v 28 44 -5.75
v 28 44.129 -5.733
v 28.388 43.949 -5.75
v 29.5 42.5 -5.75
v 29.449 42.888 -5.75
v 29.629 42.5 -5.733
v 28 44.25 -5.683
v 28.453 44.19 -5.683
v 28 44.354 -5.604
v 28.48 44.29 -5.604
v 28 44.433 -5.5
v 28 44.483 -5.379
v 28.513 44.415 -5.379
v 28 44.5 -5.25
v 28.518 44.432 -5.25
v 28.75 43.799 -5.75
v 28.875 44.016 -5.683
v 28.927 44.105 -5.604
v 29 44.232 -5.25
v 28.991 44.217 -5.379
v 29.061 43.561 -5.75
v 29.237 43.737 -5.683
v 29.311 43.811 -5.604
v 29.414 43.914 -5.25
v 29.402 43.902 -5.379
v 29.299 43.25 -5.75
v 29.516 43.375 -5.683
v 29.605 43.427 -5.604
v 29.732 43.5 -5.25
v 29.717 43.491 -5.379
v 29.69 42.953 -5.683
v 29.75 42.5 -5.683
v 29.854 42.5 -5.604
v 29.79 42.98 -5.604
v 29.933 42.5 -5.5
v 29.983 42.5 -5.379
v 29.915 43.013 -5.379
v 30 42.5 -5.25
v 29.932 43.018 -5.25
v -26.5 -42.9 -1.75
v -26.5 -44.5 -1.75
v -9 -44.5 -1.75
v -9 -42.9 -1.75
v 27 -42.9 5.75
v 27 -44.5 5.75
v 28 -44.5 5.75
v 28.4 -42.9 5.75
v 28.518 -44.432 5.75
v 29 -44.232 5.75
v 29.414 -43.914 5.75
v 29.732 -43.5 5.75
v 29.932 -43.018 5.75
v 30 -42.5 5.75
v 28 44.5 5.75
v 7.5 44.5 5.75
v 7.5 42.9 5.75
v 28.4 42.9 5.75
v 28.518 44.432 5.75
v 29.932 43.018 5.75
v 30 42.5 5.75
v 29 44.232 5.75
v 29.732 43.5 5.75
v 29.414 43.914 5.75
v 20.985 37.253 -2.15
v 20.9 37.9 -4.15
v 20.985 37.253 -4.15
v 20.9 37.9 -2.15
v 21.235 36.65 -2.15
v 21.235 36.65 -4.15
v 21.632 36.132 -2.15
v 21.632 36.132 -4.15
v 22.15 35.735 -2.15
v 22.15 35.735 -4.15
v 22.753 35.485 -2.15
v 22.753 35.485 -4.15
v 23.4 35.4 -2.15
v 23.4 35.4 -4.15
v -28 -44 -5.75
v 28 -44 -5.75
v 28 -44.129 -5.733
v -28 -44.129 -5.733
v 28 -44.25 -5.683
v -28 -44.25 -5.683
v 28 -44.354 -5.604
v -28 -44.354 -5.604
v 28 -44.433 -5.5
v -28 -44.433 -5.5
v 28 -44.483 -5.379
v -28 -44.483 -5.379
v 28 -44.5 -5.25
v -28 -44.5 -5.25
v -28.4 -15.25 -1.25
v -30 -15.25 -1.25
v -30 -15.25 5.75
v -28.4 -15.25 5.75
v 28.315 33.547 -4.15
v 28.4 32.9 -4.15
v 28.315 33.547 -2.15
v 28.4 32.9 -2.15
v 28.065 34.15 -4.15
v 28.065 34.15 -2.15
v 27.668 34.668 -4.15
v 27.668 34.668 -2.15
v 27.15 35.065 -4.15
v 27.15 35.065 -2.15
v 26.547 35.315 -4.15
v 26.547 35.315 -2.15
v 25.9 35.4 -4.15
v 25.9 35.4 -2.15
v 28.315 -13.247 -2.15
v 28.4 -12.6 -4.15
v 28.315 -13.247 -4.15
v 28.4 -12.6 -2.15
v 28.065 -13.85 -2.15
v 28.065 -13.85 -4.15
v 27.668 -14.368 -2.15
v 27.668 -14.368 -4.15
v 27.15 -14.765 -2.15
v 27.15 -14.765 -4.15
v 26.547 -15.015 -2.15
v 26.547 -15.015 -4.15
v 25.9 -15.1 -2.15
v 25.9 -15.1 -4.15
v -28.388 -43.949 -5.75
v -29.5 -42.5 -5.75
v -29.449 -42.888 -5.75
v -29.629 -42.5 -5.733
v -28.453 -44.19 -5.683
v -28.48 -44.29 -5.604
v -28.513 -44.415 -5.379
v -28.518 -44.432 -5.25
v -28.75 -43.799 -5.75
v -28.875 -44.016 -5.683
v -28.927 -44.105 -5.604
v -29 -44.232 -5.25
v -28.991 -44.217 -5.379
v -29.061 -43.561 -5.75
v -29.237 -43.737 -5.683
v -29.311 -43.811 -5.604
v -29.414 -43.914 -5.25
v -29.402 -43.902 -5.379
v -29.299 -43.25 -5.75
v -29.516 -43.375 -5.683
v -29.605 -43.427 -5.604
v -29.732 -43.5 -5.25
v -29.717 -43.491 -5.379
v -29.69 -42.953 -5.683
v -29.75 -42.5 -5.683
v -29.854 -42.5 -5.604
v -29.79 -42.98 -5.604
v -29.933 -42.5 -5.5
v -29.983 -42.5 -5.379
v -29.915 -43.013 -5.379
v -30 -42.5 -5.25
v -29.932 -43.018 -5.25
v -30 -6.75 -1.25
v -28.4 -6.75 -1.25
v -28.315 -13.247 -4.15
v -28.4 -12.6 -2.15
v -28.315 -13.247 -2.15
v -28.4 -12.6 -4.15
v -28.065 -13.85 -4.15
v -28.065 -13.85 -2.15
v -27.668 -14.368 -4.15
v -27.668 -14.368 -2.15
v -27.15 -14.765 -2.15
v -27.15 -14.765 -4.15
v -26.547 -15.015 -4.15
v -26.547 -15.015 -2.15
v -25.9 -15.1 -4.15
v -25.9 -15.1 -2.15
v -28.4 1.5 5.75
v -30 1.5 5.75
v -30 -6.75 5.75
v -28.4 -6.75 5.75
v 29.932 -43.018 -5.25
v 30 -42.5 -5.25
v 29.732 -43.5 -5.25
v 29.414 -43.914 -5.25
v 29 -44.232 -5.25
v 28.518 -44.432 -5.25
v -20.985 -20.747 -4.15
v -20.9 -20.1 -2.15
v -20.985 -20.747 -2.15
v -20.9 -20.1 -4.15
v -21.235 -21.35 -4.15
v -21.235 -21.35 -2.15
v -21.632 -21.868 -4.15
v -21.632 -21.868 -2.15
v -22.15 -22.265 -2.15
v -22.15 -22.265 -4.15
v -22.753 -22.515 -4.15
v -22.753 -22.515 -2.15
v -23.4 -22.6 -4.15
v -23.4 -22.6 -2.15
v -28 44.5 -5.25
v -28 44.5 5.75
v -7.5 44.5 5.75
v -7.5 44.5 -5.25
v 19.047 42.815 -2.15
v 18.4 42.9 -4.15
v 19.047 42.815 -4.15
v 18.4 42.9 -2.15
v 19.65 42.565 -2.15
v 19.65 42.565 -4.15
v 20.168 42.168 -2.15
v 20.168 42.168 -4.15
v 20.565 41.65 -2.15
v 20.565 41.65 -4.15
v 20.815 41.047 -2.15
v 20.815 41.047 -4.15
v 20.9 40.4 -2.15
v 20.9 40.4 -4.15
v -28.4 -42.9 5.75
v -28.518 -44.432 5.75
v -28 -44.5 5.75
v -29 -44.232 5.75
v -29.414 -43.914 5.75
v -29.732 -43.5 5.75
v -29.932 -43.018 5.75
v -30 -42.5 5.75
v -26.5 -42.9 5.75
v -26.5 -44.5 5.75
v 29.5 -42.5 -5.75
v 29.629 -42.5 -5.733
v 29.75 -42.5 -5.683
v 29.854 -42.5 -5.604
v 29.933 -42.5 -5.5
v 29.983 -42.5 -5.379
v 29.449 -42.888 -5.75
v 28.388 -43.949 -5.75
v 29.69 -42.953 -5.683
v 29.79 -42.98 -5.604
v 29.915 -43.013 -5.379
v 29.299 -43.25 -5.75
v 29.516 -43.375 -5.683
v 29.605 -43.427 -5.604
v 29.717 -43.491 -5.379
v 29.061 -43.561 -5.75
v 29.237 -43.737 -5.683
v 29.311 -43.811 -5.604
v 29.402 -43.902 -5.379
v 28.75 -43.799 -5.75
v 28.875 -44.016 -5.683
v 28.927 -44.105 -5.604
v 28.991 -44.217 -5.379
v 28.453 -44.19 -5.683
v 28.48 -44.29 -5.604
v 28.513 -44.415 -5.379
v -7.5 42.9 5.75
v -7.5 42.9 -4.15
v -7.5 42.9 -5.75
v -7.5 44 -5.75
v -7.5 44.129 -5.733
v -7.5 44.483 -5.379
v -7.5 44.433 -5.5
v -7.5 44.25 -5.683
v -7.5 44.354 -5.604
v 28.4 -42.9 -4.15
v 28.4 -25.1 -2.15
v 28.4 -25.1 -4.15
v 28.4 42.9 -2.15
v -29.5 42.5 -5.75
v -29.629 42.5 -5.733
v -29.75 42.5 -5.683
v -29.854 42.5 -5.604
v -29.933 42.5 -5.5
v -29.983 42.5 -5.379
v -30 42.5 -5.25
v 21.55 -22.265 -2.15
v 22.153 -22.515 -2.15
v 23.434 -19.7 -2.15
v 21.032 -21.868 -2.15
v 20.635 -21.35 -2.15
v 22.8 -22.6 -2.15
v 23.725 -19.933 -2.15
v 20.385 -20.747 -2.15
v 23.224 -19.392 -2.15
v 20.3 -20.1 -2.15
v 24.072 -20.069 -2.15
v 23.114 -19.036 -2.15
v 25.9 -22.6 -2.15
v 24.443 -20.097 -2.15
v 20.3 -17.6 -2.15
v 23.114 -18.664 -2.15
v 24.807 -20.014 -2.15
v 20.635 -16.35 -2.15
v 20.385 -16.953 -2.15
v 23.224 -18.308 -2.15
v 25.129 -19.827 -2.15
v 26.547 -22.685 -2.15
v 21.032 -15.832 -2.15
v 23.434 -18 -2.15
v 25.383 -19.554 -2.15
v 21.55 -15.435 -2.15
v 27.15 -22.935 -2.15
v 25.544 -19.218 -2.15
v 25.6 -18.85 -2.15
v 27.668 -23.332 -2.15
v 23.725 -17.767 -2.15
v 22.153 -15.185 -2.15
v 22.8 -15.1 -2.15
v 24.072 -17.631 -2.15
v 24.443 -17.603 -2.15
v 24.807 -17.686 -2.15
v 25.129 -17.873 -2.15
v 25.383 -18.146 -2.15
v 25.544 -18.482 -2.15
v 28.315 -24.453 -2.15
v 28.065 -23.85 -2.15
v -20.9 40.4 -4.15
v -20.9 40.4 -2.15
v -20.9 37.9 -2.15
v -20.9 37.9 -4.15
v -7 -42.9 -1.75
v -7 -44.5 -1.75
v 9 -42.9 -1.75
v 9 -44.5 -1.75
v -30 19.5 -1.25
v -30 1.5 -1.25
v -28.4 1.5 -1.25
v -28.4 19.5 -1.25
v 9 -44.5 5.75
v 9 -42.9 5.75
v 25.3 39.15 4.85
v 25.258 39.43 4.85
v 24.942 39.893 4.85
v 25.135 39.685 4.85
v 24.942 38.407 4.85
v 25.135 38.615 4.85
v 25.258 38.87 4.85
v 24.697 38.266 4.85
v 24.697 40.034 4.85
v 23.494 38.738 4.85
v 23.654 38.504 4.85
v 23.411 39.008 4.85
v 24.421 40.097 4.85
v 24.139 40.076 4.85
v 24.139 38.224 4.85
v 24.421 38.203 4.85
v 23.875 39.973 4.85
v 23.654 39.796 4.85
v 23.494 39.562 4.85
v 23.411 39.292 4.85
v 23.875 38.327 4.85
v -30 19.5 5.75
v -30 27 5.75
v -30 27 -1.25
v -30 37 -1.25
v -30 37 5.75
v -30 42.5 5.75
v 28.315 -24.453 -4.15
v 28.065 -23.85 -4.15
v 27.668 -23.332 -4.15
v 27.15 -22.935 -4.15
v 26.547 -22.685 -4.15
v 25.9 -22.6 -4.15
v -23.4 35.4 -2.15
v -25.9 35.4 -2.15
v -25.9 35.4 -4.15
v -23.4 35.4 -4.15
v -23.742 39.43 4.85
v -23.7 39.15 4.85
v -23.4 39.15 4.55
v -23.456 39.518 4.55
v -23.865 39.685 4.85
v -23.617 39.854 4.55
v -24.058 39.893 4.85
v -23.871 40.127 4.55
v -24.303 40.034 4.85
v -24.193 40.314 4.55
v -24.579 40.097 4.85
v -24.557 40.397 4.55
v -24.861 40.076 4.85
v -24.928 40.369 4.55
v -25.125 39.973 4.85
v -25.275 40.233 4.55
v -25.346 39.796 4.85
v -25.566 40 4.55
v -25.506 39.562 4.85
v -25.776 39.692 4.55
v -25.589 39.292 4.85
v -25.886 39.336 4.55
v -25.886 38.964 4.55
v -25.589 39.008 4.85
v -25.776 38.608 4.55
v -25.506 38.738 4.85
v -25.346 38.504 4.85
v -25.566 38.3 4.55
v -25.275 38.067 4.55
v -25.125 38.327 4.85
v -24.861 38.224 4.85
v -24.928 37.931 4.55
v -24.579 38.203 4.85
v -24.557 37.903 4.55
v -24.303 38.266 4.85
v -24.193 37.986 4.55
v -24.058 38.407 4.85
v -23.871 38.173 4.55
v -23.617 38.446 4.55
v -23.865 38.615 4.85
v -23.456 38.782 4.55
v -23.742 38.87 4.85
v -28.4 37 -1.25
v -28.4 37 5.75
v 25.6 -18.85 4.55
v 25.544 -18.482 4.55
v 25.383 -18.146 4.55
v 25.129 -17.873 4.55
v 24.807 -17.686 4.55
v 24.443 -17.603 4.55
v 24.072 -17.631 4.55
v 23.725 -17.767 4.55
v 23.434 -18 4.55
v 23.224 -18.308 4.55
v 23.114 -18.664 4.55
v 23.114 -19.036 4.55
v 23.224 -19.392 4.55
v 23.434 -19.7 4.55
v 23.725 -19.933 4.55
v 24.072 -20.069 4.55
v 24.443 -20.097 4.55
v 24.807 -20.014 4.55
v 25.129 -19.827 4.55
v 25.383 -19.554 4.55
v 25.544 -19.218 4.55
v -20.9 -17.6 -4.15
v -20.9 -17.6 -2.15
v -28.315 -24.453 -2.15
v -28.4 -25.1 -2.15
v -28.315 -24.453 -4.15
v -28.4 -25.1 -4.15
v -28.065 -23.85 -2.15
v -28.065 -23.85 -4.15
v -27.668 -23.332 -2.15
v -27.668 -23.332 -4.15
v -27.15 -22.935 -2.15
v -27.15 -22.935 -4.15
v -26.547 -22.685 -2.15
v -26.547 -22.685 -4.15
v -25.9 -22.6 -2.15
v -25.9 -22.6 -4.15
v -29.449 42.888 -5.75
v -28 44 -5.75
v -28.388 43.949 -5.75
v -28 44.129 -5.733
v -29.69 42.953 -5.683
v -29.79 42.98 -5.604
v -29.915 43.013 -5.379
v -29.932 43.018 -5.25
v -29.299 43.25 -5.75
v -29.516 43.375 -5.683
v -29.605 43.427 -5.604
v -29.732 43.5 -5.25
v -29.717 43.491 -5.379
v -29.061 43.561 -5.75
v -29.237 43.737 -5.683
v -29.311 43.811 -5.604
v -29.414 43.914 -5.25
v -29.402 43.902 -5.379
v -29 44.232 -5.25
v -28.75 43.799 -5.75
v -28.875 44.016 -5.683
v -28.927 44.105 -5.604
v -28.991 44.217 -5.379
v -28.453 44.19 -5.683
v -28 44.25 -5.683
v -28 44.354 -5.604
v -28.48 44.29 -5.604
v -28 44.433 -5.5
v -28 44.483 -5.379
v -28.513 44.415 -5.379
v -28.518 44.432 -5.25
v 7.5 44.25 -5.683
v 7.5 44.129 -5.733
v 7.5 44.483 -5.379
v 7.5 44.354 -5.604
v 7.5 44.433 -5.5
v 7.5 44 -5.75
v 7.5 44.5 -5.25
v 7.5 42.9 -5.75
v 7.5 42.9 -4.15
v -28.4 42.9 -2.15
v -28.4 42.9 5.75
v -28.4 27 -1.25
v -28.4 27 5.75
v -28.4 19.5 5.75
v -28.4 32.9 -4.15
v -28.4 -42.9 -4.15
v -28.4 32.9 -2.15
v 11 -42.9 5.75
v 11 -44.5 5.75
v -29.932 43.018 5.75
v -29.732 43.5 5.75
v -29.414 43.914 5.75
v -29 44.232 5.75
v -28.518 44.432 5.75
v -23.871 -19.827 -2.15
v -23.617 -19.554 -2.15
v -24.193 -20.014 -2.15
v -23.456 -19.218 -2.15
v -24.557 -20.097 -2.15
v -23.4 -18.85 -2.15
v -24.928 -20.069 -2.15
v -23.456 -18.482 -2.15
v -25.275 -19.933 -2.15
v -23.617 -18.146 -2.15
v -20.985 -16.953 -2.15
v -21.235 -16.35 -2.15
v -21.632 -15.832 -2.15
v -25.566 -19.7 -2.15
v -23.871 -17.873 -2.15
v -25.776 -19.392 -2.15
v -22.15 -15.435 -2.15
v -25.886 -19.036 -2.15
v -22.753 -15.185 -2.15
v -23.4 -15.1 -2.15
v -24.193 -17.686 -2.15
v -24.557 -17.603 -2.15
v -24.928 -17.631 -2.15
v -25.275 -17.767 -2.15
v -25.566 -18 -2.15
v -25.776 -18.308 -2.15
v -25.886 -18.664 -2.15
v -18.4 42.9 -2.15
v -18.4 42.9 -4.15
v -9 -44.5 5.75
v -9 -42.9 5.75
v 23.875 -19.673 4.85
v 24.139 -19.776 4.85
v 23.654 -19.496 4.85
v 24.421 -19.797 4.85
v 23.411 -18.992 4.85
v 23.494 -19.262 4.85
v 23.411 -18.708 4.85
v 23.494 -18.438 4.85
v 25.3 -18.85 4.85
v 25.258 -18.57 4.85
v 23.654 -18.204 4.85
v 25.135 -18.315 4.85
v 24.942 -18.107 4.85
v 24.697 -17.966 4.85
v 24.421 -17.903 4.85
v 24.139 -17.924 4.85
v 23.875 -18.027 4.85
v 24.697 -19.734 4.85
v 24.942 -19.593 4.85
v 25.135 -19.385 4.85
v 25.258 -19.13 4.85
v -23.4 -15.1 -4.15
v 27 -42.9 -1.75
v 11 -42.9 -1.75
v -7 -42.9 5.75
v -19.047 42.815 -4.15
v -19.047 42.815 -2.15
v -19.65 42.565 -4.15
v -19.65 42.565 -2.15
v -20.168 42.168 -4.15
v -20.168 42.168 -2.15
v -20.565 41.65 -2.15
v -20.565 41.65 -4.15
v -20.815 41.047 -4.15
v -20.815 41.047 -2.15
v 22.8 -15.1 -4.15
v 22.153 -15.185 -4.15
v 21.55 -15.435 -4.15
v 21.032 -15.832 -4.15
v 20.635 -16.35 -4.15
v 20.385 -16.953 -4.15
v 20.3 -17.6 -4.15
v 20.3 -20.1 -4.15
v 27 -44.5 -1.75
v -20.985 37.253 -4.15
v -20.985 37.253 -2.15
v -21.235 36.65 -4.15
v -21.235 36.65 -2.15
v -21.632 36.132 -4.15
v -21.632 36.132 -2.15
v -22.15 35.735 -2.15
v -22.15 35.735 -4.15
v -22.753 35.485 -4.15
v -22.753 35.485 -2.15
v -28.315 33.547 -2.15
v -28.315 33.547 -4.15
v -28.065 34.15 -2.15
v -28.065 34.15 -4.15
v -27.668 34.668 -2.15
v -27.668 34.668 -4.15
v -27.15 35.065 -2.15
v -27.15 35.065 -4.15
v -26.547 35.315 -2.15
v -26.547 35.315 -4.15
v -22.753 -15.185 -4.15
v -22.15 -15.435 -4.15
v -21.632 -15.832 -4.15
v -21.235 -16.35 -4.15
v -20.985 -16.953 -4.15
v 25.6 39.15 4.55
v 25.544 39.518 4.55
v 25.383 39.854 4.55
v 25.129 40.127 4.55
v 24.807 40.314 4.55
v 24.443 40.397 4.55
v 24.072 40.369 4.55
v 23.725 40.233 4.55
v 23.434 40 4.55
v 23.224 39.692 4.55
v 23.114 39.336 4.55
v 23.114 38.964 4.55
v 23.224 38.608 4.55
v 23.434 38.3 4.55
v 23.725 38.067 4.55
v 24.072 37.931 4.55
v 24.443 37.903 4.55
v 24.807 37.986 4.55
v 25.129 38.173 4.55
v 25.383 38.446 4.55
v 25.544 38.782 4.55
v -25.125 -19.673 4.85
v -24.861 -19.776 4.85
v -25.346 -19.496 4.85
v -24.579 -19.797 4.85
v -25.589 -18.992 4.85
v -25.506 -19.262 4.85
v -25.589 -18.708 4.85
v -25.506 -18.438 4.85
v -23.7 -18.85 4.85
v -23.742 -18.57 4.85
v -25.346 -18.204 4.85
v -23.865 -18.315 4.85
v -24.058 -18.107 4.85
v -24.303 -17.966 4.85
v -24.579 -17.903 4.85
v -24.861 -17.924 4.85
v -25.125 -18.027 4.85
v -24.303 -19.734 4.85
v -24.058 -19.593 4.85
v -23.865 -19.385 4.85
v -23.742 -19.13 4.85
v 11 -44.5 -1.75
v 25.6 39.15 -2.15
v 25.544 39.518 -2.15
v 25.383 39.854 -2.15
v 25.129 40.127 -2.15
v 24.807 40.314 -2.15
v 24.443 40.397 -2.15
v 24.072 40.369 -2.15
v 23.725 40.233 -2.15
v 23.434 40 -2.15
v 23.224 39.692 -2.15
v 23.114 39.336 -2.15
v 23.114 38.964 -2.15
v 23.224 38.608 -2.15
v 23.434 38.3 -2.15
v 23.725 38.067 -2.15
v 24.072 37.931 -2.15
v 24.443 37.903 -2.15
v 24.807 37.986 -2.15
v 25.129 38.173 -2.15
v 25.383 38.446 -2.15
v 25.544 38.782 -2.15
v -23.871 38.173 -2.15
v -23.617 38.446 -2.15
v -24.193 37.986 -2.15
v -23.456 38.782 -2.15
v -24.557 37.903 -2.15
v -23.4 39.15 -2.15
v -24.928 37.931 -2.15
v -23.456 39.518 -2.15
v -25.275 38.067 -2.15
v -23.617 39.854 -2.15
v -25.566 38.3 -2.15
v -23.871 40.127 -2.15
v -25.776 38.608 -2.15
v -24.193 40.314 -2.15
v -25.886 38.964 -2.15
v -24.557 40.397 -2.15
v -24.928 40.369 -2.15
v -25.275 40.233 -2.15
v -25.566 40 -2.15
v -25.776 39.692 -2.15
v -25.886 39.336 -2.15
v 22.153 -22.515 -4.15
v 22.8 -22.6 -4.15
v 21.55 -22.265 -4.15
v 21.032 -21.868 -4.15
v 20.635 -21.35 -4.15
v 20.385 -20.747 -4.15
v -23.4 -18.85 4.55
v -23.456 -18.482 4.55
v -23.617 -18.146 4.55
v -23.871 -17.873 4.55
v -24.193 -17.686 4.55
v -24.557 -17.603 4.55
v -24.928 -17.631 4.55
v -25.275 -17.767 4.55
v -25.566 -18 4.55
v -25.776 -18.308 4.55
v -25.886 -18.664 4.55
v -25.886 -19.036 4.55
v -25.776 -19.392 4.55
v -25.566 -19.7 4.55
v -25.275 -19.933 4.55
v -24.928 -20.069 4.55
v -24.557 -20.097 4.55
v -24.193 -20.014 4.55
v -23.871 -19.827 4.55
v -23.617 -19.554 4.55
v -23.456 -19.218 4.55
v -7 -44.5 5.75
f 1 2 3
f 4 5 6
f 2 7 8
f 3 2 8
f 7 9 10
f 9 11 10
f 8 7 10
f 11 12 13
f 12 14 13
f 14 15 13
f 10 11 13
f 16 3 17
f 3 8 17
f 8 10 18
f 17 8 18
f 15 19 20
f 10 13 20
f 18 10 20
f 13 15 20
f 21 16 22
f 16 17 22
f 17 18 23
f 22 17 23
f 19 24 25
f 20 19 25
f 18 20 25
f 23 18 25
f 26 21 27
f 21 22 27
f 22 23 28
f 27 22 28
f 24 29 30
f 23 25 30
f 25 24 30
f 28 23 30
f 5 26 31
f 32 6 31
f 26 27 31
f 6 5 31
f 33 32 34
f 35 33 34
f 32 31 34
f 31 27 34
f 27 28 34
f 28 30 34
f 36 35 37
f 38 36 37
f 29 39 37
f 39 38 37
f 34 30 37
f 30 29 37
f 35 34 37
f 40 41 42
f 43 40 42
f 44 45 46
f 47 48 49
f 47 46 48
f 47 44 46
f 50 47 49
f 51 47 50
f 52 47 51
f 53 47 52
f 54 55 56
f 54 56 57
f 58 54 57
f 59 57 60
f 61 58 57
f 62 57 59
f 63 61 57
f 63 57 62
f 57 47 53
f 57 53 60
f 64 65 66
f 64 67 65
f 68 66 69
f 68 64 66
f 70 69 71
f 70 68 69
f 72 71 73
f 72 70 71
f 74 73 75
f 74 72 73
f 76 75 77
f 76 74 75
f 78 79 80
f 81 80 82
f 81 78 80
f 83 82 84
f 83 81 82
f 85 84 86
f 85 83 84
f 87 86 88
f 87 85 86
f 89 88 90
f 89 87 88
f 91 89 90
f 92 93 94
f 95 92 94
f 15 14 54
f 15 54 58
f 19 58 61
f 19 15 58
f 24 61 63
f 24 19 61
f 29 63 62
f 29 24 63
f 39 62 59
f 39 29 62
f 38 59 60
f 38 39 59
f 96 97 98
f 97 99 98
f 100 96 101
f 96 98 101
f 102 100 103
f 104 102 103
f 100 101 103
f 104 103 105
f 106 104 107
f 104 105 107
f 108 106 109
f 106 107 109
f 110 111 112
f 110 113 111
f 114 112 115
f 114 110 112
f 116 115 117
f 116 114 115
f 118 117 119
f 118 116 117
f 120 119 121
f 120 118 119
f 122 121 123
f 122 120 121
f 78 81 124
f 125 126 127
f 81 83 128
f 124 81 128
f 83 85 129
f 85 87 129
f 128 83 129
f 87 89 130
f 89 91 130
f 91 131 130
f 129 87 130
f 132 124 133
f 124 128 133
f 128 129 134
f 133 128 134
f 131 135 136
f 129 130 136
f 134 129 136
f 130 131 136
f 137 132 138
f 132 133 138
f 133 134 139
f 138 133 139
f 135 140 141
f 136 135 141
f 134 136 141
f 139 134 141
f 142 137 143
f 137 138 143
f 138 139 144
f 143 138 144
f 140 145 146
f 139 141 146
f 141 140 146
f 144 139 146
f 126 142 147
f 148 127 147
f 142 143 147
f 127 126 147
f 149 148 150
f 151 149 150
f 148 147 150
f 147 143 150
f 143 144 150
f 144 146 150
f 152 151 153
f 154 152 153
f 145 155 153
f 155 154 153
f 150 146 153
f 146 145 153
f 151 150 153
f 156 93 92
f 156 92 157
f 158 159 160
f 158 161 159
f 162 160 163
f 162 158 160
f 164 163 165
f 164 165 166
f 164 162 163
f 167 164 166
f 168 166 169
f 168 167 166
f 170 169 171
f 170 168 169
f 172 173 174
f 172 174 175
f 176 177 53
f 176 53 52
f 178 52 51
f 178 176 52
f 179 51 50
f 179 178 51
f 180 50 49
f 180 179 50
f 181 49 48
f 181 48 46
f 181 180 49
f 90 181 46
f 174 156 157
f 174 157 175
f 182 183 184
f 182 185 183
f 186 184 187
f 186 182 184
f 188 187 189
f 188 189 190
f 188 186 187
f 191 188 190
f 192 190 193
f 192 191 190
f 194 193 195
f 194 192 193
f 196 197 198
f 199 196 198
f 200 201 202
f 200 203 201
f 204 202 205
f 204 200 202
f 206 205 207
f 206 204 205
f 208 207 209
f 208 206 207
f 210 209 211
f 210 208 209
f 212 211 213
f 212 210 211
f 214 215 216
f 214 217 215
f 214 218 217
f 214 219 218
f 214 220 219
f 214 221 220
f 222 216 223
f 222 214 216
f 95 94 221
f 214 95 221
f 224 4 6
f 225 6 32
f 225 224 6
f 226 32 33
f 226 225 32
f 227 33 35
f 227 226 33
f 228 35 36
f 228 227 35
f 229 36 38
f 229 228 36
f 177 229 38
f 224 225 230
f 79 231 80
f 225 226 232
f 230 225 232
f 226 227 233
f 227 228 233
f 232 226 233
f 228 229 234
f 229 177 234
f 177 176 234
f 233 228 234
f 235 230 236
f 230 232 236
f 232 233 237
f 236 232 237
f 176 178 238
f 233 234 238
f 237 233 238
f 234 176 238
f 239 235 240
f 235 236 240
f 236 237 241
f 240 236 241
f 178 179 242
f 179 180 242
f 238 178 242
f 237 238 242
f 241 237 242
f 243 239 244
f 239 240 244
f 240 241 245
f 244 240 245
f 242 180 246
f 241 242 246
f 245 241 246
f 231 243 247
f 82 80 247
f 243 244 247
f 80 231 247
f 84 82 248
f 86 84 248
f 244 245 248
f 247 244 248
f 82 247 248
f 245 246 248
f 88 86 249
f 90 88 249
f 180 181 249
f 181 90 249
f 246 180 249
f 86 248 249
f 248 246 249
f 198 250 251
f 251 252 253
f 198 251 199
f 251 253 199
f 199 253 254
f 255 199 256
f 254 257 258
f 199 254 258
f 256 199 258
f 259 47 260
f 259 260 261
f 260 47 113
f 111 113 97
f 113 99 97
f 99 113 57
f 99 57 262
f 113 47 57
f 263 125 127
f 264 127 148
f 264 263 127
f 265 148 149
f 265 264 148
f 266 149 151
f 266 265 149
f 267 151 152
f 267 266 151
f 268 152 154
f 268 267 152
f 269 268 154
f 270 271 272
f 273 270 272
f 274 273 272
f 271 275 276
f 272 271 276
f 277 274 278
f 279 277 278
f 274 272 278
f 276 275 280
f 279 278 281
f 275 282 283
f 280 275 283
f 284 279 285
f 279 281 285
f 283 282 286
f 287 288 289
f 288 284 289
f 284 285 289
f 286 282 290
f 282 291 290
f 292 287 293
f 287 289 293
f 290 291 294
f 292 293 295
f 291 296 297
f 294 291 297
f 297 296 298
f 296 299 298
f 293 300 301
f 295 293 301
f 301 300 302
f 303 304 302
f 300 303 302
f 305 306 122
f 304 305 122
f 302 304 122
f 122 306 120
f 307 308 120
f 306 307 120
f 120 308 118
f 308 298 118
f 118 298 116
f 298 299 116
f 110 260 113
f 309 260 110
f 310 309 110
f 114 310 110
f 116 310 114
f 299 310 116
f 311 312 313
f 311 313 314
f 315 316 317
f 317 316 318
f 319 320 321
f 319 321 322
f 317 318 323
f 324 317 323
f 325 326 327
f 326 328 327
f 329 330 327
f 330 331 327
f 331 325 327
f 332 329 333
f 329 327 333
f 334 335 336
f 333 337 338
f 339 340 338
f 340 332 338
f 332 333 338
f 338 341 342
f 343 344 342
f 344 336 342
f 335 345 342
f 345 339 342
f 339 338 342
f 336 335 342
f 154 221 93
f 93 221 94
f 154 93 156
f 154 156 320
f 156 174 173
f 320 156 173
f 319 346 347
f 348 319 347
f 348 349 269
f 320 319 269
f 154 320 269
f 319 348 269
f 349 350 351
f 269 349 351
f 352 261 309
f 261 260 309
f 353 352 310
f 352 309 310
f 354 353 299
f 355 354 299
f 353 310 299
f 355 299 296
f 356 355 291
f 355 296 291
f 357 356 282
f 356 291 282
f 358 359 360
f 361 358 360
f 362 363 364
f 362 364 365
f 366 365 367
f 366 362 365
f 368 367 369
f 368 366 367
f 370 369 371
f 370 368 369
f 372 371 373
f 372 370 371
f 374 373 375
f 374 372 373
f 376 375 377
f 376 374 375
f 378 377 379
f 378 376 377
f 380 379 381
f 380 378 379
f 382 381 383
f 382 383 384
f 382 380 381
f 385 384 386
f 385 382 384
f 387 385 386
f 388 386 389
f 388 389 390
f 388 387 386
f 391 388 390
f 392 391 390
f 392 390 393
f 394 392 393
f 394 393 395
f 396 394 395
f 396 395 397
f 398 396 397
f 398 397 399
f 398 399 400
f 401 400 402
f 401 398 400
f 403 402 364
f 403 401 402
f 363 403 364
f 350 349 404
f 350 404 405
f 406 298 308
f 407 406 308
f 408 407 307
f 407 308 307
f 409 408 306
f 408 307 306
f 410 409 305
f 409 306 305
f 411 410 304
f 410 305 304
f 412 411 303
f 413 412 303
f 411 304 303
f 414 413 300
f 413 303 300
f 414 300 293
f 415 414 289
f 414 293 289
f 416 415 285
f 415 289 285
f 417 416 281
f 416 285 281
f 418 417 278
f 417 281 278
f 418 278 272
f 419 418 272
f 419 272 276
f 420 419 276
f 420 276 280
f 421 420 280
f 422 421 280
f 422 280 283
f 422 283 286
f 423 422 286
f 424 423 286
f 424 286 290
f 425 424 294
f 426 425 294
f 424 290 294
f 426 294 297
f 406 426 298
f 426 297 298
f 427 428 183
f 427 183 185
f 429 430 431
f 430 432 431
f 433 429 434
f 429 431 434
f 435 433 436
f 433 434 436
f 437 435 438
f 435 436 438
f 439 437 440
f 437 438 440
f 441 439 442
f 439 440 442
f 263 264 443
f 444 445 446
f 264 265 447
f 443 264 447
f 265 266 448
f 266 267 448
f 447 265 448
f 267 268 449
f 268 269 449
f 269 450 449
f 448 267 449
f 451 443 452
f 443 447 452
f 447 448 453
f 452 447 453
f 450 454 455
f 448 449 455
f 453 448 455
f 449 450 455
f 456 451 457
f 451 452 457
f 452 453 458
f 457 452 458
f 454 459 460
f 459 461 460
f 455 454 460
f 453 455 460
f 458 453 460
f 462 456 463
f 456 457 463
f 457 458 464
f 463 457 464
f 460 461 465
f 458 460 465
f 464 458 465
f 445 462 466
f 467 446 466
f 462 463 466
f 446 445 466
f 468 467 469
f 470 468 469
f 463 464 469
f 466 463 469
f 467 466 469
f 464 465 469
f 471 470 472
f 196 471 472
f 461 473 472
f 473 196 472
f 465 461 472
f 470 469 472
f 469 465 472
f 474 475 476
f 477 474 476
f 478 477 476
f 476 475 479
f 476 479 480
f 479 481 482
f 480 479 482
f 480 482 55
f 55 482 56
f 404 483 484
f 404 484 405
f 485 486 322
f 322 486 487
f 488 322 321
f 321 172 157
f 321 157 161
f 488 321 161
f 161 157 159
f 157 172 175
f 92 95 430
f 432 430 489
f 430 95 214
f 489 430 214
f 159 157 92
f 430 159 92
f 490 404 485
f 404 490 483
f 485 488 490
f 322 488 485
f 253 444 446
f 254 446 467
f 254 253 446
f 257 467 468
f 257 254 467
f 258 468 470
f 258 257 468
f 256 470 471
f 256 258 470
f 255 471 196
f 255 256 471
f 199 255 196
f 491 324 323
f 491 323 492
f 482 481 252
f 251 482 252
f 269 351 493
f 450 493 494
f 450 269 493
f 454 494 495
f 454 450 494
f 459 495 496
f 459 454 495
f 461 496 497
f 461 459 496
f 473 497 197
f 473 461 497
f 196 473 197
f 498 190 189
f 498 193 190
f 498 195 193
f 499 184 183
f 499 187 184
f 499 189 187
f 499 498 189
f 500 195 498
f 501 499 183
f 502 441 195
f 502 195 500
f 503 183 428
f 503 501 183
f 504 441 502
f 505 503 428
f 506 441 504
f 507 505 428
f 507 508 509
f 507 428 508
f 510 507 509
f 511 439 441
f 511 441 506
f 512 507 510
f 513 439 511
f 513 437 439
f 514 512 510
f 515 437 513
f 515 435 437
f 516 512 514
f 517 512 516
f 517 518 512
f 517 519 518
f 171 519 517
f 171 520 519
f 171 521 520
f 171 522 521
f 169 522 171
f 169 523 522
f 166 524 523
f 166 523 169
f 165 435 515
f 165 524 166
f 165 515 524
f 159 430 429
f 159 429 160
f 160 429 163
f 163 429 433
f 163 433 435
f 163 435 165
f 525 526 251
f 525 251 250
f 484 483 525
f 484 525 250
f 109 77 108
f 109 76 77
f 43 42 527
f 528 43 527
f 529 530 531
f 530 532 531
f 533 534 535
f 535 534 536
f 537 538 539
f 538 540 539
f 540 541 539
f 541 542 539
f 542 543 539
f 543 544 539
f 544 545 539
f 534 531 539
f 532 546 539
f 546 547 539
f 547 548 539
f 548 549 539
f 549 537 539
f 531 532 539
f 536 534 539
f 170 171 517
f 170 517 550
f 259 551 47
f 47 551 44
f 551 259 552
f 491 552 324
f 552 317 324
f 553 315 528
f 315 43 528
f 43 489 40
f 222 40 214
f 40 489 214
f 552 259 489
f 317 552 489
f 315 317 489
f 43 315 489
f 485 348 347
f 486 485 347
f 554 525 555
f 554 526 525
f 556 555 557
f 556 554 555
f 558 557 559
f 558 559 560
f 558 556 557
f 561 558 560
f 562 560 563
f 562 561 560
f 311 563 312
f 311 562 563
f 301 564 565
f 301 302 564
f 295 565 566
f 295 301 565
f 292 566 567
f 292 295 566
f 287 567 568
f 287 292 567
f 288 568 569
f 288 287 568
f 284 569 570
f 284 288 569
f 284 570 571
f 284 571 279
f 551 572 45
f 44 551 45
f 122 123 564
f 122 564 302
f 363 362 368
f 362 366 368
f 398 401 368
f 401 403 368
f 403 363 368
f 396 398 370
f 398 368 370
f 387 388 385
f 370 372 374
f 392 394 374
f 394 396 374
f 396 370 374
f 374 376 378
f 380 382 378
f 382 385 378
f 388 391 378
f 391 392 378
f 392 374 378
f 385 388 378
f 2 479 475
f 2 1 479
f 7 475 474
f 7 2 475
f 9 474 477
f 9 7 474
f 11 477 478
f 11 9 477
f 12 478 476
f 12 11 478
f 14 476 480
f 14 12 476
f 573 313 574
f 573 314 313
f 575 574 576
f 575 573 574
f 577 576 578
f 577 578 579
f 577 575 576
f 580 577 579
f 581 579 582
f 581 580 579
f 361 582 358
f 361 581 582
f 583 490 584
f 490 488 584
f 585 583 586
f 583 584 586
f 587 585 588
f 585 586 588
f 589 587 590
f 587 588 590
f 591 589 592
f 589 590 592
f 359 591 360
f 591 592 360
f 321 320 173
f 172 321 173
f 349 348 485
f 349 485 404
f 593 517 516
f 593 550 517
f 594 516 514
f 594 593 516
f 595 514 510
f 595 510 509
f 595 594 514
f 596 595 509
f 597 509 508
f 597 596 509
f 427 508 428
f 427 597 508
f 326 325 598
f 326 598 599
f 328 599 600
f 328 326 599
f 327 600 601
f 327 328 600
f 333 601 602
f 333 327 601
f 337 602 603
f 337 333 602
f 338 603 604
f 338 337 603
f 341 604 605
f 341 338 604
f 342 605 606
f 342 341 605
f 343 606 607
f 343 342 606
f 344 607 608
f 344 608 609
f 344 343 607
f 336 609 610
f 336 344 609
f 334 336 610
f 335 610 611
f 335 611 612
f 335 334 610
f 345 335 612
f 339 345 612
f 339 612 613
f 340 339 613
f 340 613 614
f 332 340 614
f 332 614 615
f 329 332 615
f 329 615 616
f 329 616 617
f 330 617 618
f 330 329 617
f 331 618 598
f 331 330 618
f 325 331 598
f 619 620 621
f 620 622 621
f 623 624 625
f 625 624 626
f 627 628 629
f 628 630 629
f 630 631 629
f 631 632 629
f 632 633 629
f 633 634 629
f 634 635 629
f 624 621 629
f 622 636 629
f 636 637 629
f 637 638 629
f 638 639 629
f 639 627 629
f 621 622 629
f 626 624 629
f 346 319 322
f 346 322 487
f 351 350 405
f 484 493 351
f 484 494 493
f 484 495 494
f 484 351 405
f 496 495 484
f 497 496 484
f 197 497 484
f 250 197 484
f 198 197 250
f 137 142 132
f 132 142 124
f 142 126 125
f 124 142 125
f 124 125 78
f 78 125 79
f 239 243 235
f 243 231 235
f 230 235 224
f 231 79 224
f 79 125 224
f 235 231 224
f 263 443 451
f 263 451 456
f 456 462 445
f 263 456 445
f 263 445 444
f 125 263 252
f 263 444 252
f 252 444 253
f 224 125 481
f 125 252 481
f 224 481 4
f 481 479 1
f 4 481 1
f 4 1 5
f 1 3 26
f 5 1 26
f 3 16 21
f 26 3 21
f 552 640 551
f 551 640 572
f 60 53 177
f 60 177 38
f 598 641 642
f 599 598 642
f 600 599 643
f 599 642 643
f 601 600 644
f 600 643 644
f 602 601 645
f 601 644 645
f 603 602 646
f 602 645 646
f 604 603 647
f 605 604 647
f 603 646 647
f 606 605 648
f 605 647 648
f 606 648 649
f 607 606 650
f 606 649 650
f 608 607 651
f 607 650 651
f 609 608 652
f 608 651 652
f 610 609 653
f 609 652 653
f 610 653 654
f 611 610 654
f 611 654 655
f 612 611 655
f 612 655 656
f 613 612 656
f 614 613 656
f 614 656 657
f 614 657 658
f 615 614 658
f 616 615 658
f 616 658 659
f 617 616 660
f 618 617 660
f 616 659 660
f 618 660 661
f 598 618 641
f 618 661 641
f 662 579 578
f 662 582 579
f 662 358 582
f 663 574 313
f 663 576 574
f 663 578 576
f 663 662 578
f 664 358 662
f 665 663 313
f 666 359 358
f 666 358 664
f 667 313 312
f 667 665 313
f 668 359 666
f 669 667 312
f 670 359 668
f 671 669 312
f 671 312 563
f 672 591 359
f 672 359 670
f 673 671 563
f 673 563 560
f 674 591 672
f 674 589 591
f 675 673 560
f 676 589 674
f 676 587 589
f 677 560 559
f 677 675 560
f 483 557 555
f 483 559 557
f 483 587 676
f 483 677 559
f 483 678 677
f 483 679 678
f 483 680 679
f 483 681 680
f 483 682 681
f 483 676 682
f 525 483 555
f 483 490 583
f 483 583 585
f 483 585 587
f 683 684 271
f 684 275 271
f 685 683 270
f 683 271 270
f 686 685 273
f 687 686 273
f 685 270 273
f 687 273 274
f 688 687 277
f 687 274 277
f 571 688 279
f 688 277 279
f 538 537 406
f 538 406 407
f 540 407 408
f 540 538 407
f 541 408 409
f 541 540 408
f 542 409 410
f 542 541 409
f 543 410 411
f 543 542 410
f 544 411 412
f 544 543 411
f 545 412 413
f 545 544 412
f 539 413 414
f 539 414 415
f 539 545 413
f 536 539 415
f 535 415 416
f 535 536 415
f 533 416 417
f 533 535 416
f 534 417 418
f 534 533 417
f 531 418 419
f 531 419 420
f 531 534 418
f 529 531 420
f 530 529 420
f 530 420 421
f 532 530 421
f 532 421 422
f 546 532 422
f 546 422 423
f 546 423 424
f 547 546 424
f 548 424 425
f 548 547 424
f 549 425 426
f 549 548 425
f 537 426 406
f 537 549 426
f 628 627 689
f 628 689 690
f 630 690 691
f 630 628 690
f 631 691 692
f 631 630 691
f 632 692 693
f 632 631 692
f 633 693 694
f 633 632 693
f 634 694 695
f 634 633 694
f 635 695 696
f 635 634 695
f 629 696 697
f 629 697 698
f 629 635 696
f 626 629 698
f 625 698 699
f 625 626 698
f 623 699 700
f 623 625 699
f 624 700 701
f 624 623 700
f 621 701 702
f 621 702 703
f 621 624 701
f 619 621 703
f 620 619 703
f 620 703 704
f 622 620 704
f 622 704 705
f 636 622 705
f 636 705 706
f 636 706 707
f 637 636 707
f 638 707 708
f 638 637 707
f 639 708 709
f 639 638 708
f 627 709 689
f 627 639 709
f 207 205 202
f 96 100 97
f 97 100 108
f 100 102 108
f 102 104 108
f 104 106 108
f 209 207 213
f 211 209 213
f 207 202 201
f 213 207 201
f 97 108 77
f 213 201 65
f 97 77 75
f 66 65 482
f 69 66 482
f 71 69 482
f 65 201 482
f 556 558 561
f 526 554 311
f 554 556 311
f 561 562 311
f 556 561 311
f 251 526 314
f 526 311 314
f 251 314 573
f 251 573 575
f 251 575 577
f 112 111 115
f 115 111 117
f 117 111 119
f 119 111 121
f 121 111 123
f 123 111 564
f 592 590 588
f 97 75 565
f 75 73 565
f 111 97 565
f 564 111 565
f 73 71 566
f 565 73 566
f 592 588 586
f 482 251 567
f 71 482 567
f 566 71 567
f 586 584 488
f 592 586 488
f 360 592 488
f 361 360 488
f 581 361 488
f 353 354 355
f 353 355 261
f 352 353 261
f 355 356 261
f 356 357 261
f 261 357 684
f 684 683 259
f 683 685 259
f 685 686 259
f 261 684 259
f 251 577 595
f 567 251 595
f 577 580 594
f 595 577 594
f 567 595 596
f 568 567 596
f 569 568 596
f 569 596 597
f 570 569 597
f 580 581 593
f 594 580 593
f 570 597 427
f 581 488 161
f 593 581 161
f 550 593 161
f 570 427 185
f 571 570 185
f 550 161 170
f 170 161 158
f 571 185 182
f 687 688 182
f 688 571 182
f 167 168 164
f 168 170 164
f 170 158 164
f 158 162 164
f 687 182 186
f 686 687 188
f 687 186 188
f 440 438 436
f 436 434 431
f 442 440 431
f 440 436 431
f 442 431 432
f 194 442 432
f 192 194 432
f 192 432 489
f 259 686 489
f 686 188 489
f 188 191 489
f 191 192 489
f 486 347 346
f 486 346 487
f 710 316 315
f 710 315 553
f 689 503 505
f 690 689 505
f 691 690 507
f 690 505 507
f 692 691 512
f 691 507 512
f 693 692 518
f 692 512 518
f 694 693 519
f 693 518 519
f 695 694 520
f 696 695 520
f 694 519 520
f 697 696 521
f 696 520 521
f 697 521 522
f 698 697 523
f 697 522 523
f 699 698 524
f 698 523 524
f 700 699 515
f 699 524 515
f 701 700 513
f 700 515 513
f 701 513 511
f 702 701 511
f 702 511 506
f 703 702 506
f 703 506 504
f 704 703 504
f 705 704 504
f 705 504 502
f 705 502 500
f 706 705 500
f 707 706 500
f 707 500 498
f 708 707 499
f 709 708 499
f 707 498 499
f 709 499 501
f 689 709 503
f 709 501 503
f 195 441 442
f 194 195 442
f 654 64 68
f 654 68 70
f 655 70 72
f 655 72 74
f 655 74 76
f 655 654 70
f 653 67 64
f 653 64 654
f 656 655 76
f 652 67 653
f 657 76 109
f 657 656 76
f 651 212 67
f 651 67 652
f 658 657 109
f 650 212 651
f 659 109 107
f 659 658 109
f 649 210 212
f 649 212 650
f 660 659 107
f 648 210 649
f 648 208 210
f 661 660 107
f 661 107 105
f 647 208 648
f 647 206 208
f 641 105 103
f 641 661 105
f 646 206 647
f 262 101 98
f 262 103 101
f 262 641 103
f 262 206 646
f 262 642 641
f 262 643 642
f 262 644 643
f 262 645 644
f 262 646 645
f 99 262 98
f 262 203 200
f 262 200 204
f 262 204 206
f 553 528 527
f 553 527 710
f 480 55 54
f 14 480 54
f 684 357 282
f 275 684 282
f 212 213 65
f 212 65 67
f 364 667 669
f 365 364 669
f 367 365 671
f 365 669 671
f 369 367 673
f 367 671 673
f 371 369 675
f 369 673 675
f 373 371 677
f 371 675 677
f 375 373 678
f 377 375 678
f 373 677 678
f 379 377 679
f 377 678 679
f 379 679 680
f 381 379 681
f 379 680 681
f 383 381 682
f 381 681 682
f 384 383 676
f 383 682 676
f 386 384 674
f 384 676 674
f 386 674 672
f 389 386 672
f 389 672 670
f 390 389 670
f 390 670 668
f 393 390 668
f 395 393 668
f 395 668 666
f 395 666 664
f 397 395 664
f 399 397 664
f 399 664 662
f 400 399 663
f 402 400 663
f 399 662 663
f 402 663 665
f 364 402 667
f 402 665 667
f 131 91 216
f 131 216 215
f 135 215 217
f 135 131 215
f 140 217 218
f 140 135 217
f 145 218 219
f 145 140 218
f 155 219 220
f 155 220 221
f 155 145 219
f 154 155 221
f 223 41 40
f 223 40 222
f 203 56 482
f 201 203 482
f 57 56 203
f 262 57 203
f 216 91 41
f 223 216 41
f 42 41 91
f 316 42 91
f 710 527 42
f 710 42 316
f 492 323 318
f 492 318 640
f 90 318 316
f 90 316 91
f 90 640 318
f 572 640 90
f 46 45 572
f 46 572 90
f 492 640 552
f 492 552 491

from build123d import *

# Parameters (mm, degrees)
ESQUISSE1_W              = 60
ESQUISSE1_H              = 89
BOSS_EXTRU_1_DEPTH       = 11.5
ESQUISSE2_W              = 15
ESQUISSE2_H              = 1.6
ENL_V_MAT_EXTRU_1_DEPTH  = 55.886246
ENL_V_MAT_EXTRU_2_REACH  = 94.584
ESQUISSE4_W              = 15
ESQUISSE4_H              = 9.9
ENL_V_MAT_EXTRU_3_REACH  = 75.647
ESQUISSE5_W              = 85.8
ESQUISSE5_H              = 9.9
ENL_V_MAT_EXTRU_4_REACH  = 75.647
ESQUISSE6_W              = 9.9
ESQUISSE6_H              = 85.8
ENL_V_MAT_EXTRU_5_REACH  = 76.922
ESQUISSE7_W              = 7
ESQUISSE7_H              = 10
ENL_V_MAT_EXTRU_6_REACH  = 76.922
ESQUISSE8_W              = 7
ESQUISSE8_H              = 18
ENL_V_MAT_EXTRU_7_REACH  = 96.096
ESQUISSE9_W              = 17.5
ESQUISSE9_H              = 7.5
ENL_V_MAT_EXTRU_8_REACH  = 96.096
ESQUISSE10_W             = 16
ESQUISSE10_H             = 7.5
ENL_V_MAT_EXTRU_9_REACH  = 96.096
ESQUISSE11_W             = 16
ESQUISSE11_H             = 7.5
ENL_V_MAT_EXTRU_10_REACH = 76.922
ESQUISSE12_W             = 7
ESQUISSE12_H             = 8.5
ESQUISSE23_W             = 2
ESQUISSE23_H             = 7.5
BOSS_EXTRU_5_DEPTH       = 7.5
ESQUISSE24_W             = 7.5
ESQUISSE24_H             = 2
BOSS_EXTRU_6_DEPTH       = 7.5
ESQUISSE25_W             = 2
ESQUISSE25_H             = 7.5
BOSS_EXTRU_7_DEPTH       = 8.1
ESQUISSE26_W             = 2
ESQUISSE26_H             = 7.5
BOSS_EXTRU_8_DEPTH       = 7.5
ESQUISSE28_W             = 1.25
ESQUISSE28_H             = 7
ESQUISSE29_W             = 1.25
ESQUISSE29_H             = 7
ESQUISSE30_W             = 1.25
ESQUISSE30_H             = 7
ESQUISSE31_W             = 1.25
ESQUISSE31_H             = 7
CONG_1_R                 = 2
CHANFREIN1_SIZE          = 0.3
CONG_2_R                 = 0.5
CONG_9_R                 = 2.5


with BuildPart() as part:
    # Esquisse1 → Boss.-Extru.1 (new body)
    with BuildSketch(Plane.XY.offset(5.75)):
        Rectangle(ESQUISSE1_W, ESQUISSE1_H)
    extrude(amount=-BOSS_EXTRU_1_DEPTH)

    # Esquisse2 → Enlèv. mat.-Extru.1 (cut, through all)
    with BuildSketch(Plane(origin=(0, 0, -5.75), x_dir=(-1, 0, 0), z_dir=(0, 0, -1))):
        with Locations((0, 43.7)):
            Rectangle(ESQUISSE2_W, ESQUISSE2_H)
    extrude(amount=-ENL_V_MAT_EXTRU_1_DEPTH, mode=Mode.SUBTRACT)

    # Esquisse4 → Enlèv. mat.-Extru.2 (cut, up to next)
    with BuildSketch(Plane.XZ.offset(42.9), mode=Mode.PRIVATE) as enl_v_mat_extru_2_sk1:
        with Locations((0, 0.8)):
            Rectangle(ESQUISSE4_W, ESQUISSE4_H)
    enl_v_mat_extru_2_tool1 = extrude(enl_v_mat_extru_2_sk1.sketch, amount=-ENL_V_MAT_EXTRU_2_REACH, mode=Mode.PRIVATE) & part.part
    add(enl_v_mat_extru_2_tool1.solids().sort_by_distance((0, -42.9, 0.8))[0], mode=Mode.SUBTRACT)

    # Esquisse5 → Enlèv. mat.-Extru.3 (cut, up to next)
    with BuildSketch(Plane(origin=(-28.4, 0, 0), x_dir=(0, -1, 0), z_dir=(-1, 0, 0)), mode=Mode.PRIVATE) as enl_v_mat_extru_3_sk1:
        with Locations((0, 0.8)):
            Rectangle(ESQUISSE5_W, ESQUISSE5_H)
    enl_v_mat_extru_3_tool1 = extrude(enl_v_mat_extru_3_sk1.sketch, amount=-ENL_V_MAT_EXTRU_3_REACH, mode=Mode.PRIVATE) & part.part
    add(enl_v_mat_extru_3_tool1.solids().sort_by_distance((-28.4, 0, 0.8))[0], mode=Mode.SUBTRACT)

    # Esquisse6 → Enlèv. mat.-Extru.4 (cut, up to next)
    with BuildSketch(Plane(origin=(28.4, 0, 0), x_dir=(0, 0, -1), z_dir=(1, 0, 0)), mode=Mode.PRIVATE) as enl_v_mat_extru_4_sk1:
        with Locations((-0.8, 0)):
            Rectangle(ESQUISSE6_W, ESQUISSE6_H)
    enl_v_mat_extru_4_tool1 = extrude(enl_v_mat_extru_4_sk1.sketch, amount=-ENL_V_MAT_EXTRU_4_REACH, mode=Mode.PRIVATE) & part.part
    add(enl_v_mat_extru_4_tool1.solids().sort_by_distance((28.4, 0, 0.8))[0], mode=Mode.SUBTRACT)

    # Esquisse7 → Enlèv. mat.-Extru.5 (cut, up to next)
    with BuildSketch(Plane.ZY.offset(30), mode=Mode.PRIVATE) as enl_v_mat_extru_5_sk1:
        with Locations((2.25, 32)):
            Rectangle(ESQUISSE7_W, ESQUISSE7_H)
    enl_v_mat_extru_5_tool1 = extrude(enl_v_mat_extru_5_sk1.sketch, amount=-ENL_V_MAT_EXTRU_5_REACH, mode=Mode.PRIVATE) & part.part
    add(enl_v_mat_extru_5_tool1.solids().sort_by_distance((-30, 32, 2.25))[0], mode=Mode.SUBTRACT)

    # Esquisse8 → Enlèv. mat.-Extru.6 (cut, up to next)
    with BuildSketch(Plane.ZY.offset(30), mode=Mode.PRIVATE) as enl_v_mat_extru_6_sk1:
        with Locations((2.25, 10.5)):
            Rectangle(ESQUISSE8_W, ESQUISSE8_H)
    enl_v_mat_extru_6_tool1 = extrude(enl_v_mat_extru_6_sk1.sketch, amount=-ENL_V_MAT_EXTRU_6_REACH, mode=Mode.PRIVATE) & part.part
    add(enl_v_mat_extru_6_tool1.solids().sort_by_distance((-30, 10.5, 2.25))[0], mode=Mode.SUBTRACT)

    # Esquisse9 → Enlèv. mat.-Extru.7 (cut, up to next)
    with BuildSketch(Plane.XZ.offset(44.5), mode=Mode.PRIVATE) as enl_v_mat_extru_7_sk1:
        with Locations((-17.75, 2)):
            Rectangle(ESQUISSE9_W, ESQUISSE9_H)
    enl_v_mat_extru_7_tool1 = extrude(enl_v_mat_extru_7_sk1.sketch, amount=-ENL_V_MAT_EXTRU_7_REACH, mode=Mode.PRIVATE) & part.part
    add(enl_v_mat_extru_7_tool1.solids().sort_by_distance((-17.75, -44.5, 2))[0], mode=Mode.SUBTRACT)

    # Esquisse10 → Enlèv. mat.-Extru.8 (cut, up to next)
    with BuildSketch(Plane.XZ.offset(44.5), mode=Mode.PRIVATE) as enl_v_mat_extru_8_sk1:
        with Locations((1, 2)):
            Rectangle(ESQUISSE10_W, ESQUISSE10_H)
    enl_v_mat_extru_8_tool1 = extrude(enl_v_mat_extru_8_sk1.sketch, amount=-ENL_V_MAT_EXTRU_8_REACH, mode=Mode.PRIVATE) & part.part
    add(enl_v_mat_extru_8_tool1.solids().sort_by_distance((1, -44.5, 2))[0], mode=Mode.SUBTRACT)

    # Esquisse11 → Enlèv. mat.-Extru.9 (cut, up to next)
    with BuildSketch(Plane.XZ.offset(44.5), mode=Mode.PRIVATE) as enl_v_mat_extru_9_sk1:
        with Locations((19, 2)):
            Rectangle(ESQUISSE11_W, ESQUISSE11_H)
    enl_v_mat_extru_9_tool1 = extrude(enl_v_mat_extru_9_sk1.sketch, amount=-ENL_V_MAT_EXTRU_9_REACH, mode=Mode.PRIVATE) & part.part
    add(enl_v_mat_extru_9_tool1.solids().sort_by_distance((19, -44.5, 2))[0], mode=Mode.SUBTRACT)

    # Esquisse12 → Enlèv. mat.-Extru.10 (cut, up to next)
    with BuildSketch(Plane.ZY.offset(30), mode=Mode.PRIVATE) as enl_v_mat_extru_10_sk1:
        with Locations((2.25, -11)):
            Rectangle(ESQUISSE12_W, ESQUISSE12_H)
    enl_v_mat_extru_10_tool1 = extrude(enl_v_mat_extru_10_sk1.sketch, amount=-ENL_V_MAT_EXTRU_10_REACH, mode=Mode.PRIVATE) & part.part
    add(enl_v_mat_extru_10_tool1.solids().sort_by_distance((-30, -11, 2.25))[0], mode=Mode.SUBTRACT)

    # Esquisse23 → Boss.-Extru.5 (add)
    with BuildSketch(Plane(origin=(-28.4, 0, 0), x_dir=(0, 0, -1), z_dir=(1, 0, 0))):
        with Locations((3.15, 39.15)):
            Rectangle(ESQUISSE23_W, ESQUISSE23_H)
    extrude(amount=BOSS_EXTRU_5_DEPTH)

    # Esquisse24 → Boss.-Extru.6 (add)
    with BuildSketch(Plane.XZ.offset(-42.9)):
        with Locations((24.65, -3.15)):
            Rectangle(ESQUISSE24_W, ESQUISSE24_H)
    extrude(amount=BOSS_EXTRU_6_DEPTH)

    # Esquisse25 → Boss.-Extru.7 (add)
    with BuildSketch(Plane.ZY.offset(-28.4)):
        with Locations((-3.15, -18.85)):
            Rectangle(ESQUISSE25_W, ESQUISSE25_H)
    extrude(amount=BOSS_EXTRU_7_DEPTH)

    # Esquisse26 → Boss.-Extru.8 (add)
    with BuildSketch(Plane(origin=(-28.4, 0, 0), x_dir=(0, 0, -1), z_dir=(1, 0, 0))):
        with Locations((3.15, -18.85)):
            Rectangle(ESQUISSE26_W, ESQUISSE26_H)
    extrude(amount=BOSS_EXTRU_8_DEPTH)

    # Esquisse28 → Révolution1 (revolve)
    with BuildSketch(Plane(origin=(0, -18.85, 0), x_dir=(1, 0, 0), z_dir=(0, 1, 0))):
        with Locations((24.975, -1.35)):
            Rectangle(ESQUISSE28_W, ESQUISSE28_H)
    revolve(axis=Axis((24.35, -18.85, -2.15), (0, 0, 1)))

    # Esquisse29 → Révolution2 (revolve)
    with BuildSketch(Plane(origin=(0, 39.15, 0), x_dir=(1, 0, 0), z_dir=(0, 1, 0))):
        with Locations((24.975, -1.35)):
            Rectangle(ESQUISSE29_W, ESQUISSE29_H)
    revolve(axis=Axis((24.35, 39.15, -2.15), (0, 0, 1)))

    # Esquisse30 → Révolution3 (revolve)
    with BuildSketch(Plane(origin=(0, 39.15, 0), x_dir=(1, 0, 0), z_dir=(0, 1, 0))):
        with Locations((-24.025, -1.35)):
            Rectangle(ESQUISSE30_W, ESQUISSE30_H)
    revolve(axis=Axis((-24.65, 39.15, -2.15), (0, 0, 1)))

    # Esquisse31 → Révolution4 (revolve)
    with BuildSketch(Plane(origin=(0, -18.85, 0), x_dir=(1, 0, 0), z_dir=(0, 1, 0))):
        with Locations((-24.025, -1.35)):
            Rectangle(ESQUISSE31_W, ESQUISSE31_H)
    revolve(axis=Axis((-24.65, -18.85, -2.15), (0, 0, 1)))

    # Congé1
    cong_1_edges = [part.edges().sort_by_distance(p)[0] for p in [
        (30, -44.5, 0),
        (-30, -44.5, 0),
        (-30, 44.5, 0),
        (30, 44.5, 0),
    ]]
    fillet(cong_1_edges, radius=CONG_1_R)

    # Chanfrein1
    chanfrein1_edges = [part.edges().sort_by_distance(p)[0] for p in [
        (23.1, -18.85, 4.85),
        (23.1, 39.15, 4.85),
        (-25.9, 39.15, 4.85),
        (-25.9, -18.85, 4.85),
    ]]
    chamfer(chanfrein1_edges, length=CHANFREIN1_SIZE)

    # Congé2
    cong_2_edges = [part.edges().sort_by_distance(p)[0] for p in [
        (-17.75, 44.5, -5.75),
        (30, 0, -5.75),
        (17.75, 44.5, -5.75),
        (0, -44.5, -5.75),
        (-30, 0, -5.75),
        (-29.414213562, -43.914213562, -5.75),
        (29.414213562, -43.914213562, -5.75),
        (-29.414213562, 43.914213562, -5.75),
        (29.414213562, 43.914213562, -5.75),
    ]]
    fillet(cong_2_edges, radius=CONG_2_R)

    # Congé9
    cong_9_edges = [part.edges().sort_by_distance(p)[0] for p in [
        (-28.4, 35.4, -3.15),
        (-20.9, 35.4, -3.15),
        (-20.9, 42.9, -3.15),
        (20.9, 42.9, -3.15),
        (20.9, 35.4, -3.15),
        (28.4, 35.4, -3.15),
        (28.4, -22.6, -3.15),
        (28.4, -15.1, -3.15),
        (20.3, -22.6, -3.15),
        (20.3, -15.1, -3.15),
        (-28.4, -22.6, -3.15),
        (-28.4, -15.1, -3.15),
        (-20.9, -22.6, -3.15),
        (-20.9, -15.1, -3.15),
    ]]
    fillet(cong_9_edges, radius=CONG_9_R)


solid = part.part
